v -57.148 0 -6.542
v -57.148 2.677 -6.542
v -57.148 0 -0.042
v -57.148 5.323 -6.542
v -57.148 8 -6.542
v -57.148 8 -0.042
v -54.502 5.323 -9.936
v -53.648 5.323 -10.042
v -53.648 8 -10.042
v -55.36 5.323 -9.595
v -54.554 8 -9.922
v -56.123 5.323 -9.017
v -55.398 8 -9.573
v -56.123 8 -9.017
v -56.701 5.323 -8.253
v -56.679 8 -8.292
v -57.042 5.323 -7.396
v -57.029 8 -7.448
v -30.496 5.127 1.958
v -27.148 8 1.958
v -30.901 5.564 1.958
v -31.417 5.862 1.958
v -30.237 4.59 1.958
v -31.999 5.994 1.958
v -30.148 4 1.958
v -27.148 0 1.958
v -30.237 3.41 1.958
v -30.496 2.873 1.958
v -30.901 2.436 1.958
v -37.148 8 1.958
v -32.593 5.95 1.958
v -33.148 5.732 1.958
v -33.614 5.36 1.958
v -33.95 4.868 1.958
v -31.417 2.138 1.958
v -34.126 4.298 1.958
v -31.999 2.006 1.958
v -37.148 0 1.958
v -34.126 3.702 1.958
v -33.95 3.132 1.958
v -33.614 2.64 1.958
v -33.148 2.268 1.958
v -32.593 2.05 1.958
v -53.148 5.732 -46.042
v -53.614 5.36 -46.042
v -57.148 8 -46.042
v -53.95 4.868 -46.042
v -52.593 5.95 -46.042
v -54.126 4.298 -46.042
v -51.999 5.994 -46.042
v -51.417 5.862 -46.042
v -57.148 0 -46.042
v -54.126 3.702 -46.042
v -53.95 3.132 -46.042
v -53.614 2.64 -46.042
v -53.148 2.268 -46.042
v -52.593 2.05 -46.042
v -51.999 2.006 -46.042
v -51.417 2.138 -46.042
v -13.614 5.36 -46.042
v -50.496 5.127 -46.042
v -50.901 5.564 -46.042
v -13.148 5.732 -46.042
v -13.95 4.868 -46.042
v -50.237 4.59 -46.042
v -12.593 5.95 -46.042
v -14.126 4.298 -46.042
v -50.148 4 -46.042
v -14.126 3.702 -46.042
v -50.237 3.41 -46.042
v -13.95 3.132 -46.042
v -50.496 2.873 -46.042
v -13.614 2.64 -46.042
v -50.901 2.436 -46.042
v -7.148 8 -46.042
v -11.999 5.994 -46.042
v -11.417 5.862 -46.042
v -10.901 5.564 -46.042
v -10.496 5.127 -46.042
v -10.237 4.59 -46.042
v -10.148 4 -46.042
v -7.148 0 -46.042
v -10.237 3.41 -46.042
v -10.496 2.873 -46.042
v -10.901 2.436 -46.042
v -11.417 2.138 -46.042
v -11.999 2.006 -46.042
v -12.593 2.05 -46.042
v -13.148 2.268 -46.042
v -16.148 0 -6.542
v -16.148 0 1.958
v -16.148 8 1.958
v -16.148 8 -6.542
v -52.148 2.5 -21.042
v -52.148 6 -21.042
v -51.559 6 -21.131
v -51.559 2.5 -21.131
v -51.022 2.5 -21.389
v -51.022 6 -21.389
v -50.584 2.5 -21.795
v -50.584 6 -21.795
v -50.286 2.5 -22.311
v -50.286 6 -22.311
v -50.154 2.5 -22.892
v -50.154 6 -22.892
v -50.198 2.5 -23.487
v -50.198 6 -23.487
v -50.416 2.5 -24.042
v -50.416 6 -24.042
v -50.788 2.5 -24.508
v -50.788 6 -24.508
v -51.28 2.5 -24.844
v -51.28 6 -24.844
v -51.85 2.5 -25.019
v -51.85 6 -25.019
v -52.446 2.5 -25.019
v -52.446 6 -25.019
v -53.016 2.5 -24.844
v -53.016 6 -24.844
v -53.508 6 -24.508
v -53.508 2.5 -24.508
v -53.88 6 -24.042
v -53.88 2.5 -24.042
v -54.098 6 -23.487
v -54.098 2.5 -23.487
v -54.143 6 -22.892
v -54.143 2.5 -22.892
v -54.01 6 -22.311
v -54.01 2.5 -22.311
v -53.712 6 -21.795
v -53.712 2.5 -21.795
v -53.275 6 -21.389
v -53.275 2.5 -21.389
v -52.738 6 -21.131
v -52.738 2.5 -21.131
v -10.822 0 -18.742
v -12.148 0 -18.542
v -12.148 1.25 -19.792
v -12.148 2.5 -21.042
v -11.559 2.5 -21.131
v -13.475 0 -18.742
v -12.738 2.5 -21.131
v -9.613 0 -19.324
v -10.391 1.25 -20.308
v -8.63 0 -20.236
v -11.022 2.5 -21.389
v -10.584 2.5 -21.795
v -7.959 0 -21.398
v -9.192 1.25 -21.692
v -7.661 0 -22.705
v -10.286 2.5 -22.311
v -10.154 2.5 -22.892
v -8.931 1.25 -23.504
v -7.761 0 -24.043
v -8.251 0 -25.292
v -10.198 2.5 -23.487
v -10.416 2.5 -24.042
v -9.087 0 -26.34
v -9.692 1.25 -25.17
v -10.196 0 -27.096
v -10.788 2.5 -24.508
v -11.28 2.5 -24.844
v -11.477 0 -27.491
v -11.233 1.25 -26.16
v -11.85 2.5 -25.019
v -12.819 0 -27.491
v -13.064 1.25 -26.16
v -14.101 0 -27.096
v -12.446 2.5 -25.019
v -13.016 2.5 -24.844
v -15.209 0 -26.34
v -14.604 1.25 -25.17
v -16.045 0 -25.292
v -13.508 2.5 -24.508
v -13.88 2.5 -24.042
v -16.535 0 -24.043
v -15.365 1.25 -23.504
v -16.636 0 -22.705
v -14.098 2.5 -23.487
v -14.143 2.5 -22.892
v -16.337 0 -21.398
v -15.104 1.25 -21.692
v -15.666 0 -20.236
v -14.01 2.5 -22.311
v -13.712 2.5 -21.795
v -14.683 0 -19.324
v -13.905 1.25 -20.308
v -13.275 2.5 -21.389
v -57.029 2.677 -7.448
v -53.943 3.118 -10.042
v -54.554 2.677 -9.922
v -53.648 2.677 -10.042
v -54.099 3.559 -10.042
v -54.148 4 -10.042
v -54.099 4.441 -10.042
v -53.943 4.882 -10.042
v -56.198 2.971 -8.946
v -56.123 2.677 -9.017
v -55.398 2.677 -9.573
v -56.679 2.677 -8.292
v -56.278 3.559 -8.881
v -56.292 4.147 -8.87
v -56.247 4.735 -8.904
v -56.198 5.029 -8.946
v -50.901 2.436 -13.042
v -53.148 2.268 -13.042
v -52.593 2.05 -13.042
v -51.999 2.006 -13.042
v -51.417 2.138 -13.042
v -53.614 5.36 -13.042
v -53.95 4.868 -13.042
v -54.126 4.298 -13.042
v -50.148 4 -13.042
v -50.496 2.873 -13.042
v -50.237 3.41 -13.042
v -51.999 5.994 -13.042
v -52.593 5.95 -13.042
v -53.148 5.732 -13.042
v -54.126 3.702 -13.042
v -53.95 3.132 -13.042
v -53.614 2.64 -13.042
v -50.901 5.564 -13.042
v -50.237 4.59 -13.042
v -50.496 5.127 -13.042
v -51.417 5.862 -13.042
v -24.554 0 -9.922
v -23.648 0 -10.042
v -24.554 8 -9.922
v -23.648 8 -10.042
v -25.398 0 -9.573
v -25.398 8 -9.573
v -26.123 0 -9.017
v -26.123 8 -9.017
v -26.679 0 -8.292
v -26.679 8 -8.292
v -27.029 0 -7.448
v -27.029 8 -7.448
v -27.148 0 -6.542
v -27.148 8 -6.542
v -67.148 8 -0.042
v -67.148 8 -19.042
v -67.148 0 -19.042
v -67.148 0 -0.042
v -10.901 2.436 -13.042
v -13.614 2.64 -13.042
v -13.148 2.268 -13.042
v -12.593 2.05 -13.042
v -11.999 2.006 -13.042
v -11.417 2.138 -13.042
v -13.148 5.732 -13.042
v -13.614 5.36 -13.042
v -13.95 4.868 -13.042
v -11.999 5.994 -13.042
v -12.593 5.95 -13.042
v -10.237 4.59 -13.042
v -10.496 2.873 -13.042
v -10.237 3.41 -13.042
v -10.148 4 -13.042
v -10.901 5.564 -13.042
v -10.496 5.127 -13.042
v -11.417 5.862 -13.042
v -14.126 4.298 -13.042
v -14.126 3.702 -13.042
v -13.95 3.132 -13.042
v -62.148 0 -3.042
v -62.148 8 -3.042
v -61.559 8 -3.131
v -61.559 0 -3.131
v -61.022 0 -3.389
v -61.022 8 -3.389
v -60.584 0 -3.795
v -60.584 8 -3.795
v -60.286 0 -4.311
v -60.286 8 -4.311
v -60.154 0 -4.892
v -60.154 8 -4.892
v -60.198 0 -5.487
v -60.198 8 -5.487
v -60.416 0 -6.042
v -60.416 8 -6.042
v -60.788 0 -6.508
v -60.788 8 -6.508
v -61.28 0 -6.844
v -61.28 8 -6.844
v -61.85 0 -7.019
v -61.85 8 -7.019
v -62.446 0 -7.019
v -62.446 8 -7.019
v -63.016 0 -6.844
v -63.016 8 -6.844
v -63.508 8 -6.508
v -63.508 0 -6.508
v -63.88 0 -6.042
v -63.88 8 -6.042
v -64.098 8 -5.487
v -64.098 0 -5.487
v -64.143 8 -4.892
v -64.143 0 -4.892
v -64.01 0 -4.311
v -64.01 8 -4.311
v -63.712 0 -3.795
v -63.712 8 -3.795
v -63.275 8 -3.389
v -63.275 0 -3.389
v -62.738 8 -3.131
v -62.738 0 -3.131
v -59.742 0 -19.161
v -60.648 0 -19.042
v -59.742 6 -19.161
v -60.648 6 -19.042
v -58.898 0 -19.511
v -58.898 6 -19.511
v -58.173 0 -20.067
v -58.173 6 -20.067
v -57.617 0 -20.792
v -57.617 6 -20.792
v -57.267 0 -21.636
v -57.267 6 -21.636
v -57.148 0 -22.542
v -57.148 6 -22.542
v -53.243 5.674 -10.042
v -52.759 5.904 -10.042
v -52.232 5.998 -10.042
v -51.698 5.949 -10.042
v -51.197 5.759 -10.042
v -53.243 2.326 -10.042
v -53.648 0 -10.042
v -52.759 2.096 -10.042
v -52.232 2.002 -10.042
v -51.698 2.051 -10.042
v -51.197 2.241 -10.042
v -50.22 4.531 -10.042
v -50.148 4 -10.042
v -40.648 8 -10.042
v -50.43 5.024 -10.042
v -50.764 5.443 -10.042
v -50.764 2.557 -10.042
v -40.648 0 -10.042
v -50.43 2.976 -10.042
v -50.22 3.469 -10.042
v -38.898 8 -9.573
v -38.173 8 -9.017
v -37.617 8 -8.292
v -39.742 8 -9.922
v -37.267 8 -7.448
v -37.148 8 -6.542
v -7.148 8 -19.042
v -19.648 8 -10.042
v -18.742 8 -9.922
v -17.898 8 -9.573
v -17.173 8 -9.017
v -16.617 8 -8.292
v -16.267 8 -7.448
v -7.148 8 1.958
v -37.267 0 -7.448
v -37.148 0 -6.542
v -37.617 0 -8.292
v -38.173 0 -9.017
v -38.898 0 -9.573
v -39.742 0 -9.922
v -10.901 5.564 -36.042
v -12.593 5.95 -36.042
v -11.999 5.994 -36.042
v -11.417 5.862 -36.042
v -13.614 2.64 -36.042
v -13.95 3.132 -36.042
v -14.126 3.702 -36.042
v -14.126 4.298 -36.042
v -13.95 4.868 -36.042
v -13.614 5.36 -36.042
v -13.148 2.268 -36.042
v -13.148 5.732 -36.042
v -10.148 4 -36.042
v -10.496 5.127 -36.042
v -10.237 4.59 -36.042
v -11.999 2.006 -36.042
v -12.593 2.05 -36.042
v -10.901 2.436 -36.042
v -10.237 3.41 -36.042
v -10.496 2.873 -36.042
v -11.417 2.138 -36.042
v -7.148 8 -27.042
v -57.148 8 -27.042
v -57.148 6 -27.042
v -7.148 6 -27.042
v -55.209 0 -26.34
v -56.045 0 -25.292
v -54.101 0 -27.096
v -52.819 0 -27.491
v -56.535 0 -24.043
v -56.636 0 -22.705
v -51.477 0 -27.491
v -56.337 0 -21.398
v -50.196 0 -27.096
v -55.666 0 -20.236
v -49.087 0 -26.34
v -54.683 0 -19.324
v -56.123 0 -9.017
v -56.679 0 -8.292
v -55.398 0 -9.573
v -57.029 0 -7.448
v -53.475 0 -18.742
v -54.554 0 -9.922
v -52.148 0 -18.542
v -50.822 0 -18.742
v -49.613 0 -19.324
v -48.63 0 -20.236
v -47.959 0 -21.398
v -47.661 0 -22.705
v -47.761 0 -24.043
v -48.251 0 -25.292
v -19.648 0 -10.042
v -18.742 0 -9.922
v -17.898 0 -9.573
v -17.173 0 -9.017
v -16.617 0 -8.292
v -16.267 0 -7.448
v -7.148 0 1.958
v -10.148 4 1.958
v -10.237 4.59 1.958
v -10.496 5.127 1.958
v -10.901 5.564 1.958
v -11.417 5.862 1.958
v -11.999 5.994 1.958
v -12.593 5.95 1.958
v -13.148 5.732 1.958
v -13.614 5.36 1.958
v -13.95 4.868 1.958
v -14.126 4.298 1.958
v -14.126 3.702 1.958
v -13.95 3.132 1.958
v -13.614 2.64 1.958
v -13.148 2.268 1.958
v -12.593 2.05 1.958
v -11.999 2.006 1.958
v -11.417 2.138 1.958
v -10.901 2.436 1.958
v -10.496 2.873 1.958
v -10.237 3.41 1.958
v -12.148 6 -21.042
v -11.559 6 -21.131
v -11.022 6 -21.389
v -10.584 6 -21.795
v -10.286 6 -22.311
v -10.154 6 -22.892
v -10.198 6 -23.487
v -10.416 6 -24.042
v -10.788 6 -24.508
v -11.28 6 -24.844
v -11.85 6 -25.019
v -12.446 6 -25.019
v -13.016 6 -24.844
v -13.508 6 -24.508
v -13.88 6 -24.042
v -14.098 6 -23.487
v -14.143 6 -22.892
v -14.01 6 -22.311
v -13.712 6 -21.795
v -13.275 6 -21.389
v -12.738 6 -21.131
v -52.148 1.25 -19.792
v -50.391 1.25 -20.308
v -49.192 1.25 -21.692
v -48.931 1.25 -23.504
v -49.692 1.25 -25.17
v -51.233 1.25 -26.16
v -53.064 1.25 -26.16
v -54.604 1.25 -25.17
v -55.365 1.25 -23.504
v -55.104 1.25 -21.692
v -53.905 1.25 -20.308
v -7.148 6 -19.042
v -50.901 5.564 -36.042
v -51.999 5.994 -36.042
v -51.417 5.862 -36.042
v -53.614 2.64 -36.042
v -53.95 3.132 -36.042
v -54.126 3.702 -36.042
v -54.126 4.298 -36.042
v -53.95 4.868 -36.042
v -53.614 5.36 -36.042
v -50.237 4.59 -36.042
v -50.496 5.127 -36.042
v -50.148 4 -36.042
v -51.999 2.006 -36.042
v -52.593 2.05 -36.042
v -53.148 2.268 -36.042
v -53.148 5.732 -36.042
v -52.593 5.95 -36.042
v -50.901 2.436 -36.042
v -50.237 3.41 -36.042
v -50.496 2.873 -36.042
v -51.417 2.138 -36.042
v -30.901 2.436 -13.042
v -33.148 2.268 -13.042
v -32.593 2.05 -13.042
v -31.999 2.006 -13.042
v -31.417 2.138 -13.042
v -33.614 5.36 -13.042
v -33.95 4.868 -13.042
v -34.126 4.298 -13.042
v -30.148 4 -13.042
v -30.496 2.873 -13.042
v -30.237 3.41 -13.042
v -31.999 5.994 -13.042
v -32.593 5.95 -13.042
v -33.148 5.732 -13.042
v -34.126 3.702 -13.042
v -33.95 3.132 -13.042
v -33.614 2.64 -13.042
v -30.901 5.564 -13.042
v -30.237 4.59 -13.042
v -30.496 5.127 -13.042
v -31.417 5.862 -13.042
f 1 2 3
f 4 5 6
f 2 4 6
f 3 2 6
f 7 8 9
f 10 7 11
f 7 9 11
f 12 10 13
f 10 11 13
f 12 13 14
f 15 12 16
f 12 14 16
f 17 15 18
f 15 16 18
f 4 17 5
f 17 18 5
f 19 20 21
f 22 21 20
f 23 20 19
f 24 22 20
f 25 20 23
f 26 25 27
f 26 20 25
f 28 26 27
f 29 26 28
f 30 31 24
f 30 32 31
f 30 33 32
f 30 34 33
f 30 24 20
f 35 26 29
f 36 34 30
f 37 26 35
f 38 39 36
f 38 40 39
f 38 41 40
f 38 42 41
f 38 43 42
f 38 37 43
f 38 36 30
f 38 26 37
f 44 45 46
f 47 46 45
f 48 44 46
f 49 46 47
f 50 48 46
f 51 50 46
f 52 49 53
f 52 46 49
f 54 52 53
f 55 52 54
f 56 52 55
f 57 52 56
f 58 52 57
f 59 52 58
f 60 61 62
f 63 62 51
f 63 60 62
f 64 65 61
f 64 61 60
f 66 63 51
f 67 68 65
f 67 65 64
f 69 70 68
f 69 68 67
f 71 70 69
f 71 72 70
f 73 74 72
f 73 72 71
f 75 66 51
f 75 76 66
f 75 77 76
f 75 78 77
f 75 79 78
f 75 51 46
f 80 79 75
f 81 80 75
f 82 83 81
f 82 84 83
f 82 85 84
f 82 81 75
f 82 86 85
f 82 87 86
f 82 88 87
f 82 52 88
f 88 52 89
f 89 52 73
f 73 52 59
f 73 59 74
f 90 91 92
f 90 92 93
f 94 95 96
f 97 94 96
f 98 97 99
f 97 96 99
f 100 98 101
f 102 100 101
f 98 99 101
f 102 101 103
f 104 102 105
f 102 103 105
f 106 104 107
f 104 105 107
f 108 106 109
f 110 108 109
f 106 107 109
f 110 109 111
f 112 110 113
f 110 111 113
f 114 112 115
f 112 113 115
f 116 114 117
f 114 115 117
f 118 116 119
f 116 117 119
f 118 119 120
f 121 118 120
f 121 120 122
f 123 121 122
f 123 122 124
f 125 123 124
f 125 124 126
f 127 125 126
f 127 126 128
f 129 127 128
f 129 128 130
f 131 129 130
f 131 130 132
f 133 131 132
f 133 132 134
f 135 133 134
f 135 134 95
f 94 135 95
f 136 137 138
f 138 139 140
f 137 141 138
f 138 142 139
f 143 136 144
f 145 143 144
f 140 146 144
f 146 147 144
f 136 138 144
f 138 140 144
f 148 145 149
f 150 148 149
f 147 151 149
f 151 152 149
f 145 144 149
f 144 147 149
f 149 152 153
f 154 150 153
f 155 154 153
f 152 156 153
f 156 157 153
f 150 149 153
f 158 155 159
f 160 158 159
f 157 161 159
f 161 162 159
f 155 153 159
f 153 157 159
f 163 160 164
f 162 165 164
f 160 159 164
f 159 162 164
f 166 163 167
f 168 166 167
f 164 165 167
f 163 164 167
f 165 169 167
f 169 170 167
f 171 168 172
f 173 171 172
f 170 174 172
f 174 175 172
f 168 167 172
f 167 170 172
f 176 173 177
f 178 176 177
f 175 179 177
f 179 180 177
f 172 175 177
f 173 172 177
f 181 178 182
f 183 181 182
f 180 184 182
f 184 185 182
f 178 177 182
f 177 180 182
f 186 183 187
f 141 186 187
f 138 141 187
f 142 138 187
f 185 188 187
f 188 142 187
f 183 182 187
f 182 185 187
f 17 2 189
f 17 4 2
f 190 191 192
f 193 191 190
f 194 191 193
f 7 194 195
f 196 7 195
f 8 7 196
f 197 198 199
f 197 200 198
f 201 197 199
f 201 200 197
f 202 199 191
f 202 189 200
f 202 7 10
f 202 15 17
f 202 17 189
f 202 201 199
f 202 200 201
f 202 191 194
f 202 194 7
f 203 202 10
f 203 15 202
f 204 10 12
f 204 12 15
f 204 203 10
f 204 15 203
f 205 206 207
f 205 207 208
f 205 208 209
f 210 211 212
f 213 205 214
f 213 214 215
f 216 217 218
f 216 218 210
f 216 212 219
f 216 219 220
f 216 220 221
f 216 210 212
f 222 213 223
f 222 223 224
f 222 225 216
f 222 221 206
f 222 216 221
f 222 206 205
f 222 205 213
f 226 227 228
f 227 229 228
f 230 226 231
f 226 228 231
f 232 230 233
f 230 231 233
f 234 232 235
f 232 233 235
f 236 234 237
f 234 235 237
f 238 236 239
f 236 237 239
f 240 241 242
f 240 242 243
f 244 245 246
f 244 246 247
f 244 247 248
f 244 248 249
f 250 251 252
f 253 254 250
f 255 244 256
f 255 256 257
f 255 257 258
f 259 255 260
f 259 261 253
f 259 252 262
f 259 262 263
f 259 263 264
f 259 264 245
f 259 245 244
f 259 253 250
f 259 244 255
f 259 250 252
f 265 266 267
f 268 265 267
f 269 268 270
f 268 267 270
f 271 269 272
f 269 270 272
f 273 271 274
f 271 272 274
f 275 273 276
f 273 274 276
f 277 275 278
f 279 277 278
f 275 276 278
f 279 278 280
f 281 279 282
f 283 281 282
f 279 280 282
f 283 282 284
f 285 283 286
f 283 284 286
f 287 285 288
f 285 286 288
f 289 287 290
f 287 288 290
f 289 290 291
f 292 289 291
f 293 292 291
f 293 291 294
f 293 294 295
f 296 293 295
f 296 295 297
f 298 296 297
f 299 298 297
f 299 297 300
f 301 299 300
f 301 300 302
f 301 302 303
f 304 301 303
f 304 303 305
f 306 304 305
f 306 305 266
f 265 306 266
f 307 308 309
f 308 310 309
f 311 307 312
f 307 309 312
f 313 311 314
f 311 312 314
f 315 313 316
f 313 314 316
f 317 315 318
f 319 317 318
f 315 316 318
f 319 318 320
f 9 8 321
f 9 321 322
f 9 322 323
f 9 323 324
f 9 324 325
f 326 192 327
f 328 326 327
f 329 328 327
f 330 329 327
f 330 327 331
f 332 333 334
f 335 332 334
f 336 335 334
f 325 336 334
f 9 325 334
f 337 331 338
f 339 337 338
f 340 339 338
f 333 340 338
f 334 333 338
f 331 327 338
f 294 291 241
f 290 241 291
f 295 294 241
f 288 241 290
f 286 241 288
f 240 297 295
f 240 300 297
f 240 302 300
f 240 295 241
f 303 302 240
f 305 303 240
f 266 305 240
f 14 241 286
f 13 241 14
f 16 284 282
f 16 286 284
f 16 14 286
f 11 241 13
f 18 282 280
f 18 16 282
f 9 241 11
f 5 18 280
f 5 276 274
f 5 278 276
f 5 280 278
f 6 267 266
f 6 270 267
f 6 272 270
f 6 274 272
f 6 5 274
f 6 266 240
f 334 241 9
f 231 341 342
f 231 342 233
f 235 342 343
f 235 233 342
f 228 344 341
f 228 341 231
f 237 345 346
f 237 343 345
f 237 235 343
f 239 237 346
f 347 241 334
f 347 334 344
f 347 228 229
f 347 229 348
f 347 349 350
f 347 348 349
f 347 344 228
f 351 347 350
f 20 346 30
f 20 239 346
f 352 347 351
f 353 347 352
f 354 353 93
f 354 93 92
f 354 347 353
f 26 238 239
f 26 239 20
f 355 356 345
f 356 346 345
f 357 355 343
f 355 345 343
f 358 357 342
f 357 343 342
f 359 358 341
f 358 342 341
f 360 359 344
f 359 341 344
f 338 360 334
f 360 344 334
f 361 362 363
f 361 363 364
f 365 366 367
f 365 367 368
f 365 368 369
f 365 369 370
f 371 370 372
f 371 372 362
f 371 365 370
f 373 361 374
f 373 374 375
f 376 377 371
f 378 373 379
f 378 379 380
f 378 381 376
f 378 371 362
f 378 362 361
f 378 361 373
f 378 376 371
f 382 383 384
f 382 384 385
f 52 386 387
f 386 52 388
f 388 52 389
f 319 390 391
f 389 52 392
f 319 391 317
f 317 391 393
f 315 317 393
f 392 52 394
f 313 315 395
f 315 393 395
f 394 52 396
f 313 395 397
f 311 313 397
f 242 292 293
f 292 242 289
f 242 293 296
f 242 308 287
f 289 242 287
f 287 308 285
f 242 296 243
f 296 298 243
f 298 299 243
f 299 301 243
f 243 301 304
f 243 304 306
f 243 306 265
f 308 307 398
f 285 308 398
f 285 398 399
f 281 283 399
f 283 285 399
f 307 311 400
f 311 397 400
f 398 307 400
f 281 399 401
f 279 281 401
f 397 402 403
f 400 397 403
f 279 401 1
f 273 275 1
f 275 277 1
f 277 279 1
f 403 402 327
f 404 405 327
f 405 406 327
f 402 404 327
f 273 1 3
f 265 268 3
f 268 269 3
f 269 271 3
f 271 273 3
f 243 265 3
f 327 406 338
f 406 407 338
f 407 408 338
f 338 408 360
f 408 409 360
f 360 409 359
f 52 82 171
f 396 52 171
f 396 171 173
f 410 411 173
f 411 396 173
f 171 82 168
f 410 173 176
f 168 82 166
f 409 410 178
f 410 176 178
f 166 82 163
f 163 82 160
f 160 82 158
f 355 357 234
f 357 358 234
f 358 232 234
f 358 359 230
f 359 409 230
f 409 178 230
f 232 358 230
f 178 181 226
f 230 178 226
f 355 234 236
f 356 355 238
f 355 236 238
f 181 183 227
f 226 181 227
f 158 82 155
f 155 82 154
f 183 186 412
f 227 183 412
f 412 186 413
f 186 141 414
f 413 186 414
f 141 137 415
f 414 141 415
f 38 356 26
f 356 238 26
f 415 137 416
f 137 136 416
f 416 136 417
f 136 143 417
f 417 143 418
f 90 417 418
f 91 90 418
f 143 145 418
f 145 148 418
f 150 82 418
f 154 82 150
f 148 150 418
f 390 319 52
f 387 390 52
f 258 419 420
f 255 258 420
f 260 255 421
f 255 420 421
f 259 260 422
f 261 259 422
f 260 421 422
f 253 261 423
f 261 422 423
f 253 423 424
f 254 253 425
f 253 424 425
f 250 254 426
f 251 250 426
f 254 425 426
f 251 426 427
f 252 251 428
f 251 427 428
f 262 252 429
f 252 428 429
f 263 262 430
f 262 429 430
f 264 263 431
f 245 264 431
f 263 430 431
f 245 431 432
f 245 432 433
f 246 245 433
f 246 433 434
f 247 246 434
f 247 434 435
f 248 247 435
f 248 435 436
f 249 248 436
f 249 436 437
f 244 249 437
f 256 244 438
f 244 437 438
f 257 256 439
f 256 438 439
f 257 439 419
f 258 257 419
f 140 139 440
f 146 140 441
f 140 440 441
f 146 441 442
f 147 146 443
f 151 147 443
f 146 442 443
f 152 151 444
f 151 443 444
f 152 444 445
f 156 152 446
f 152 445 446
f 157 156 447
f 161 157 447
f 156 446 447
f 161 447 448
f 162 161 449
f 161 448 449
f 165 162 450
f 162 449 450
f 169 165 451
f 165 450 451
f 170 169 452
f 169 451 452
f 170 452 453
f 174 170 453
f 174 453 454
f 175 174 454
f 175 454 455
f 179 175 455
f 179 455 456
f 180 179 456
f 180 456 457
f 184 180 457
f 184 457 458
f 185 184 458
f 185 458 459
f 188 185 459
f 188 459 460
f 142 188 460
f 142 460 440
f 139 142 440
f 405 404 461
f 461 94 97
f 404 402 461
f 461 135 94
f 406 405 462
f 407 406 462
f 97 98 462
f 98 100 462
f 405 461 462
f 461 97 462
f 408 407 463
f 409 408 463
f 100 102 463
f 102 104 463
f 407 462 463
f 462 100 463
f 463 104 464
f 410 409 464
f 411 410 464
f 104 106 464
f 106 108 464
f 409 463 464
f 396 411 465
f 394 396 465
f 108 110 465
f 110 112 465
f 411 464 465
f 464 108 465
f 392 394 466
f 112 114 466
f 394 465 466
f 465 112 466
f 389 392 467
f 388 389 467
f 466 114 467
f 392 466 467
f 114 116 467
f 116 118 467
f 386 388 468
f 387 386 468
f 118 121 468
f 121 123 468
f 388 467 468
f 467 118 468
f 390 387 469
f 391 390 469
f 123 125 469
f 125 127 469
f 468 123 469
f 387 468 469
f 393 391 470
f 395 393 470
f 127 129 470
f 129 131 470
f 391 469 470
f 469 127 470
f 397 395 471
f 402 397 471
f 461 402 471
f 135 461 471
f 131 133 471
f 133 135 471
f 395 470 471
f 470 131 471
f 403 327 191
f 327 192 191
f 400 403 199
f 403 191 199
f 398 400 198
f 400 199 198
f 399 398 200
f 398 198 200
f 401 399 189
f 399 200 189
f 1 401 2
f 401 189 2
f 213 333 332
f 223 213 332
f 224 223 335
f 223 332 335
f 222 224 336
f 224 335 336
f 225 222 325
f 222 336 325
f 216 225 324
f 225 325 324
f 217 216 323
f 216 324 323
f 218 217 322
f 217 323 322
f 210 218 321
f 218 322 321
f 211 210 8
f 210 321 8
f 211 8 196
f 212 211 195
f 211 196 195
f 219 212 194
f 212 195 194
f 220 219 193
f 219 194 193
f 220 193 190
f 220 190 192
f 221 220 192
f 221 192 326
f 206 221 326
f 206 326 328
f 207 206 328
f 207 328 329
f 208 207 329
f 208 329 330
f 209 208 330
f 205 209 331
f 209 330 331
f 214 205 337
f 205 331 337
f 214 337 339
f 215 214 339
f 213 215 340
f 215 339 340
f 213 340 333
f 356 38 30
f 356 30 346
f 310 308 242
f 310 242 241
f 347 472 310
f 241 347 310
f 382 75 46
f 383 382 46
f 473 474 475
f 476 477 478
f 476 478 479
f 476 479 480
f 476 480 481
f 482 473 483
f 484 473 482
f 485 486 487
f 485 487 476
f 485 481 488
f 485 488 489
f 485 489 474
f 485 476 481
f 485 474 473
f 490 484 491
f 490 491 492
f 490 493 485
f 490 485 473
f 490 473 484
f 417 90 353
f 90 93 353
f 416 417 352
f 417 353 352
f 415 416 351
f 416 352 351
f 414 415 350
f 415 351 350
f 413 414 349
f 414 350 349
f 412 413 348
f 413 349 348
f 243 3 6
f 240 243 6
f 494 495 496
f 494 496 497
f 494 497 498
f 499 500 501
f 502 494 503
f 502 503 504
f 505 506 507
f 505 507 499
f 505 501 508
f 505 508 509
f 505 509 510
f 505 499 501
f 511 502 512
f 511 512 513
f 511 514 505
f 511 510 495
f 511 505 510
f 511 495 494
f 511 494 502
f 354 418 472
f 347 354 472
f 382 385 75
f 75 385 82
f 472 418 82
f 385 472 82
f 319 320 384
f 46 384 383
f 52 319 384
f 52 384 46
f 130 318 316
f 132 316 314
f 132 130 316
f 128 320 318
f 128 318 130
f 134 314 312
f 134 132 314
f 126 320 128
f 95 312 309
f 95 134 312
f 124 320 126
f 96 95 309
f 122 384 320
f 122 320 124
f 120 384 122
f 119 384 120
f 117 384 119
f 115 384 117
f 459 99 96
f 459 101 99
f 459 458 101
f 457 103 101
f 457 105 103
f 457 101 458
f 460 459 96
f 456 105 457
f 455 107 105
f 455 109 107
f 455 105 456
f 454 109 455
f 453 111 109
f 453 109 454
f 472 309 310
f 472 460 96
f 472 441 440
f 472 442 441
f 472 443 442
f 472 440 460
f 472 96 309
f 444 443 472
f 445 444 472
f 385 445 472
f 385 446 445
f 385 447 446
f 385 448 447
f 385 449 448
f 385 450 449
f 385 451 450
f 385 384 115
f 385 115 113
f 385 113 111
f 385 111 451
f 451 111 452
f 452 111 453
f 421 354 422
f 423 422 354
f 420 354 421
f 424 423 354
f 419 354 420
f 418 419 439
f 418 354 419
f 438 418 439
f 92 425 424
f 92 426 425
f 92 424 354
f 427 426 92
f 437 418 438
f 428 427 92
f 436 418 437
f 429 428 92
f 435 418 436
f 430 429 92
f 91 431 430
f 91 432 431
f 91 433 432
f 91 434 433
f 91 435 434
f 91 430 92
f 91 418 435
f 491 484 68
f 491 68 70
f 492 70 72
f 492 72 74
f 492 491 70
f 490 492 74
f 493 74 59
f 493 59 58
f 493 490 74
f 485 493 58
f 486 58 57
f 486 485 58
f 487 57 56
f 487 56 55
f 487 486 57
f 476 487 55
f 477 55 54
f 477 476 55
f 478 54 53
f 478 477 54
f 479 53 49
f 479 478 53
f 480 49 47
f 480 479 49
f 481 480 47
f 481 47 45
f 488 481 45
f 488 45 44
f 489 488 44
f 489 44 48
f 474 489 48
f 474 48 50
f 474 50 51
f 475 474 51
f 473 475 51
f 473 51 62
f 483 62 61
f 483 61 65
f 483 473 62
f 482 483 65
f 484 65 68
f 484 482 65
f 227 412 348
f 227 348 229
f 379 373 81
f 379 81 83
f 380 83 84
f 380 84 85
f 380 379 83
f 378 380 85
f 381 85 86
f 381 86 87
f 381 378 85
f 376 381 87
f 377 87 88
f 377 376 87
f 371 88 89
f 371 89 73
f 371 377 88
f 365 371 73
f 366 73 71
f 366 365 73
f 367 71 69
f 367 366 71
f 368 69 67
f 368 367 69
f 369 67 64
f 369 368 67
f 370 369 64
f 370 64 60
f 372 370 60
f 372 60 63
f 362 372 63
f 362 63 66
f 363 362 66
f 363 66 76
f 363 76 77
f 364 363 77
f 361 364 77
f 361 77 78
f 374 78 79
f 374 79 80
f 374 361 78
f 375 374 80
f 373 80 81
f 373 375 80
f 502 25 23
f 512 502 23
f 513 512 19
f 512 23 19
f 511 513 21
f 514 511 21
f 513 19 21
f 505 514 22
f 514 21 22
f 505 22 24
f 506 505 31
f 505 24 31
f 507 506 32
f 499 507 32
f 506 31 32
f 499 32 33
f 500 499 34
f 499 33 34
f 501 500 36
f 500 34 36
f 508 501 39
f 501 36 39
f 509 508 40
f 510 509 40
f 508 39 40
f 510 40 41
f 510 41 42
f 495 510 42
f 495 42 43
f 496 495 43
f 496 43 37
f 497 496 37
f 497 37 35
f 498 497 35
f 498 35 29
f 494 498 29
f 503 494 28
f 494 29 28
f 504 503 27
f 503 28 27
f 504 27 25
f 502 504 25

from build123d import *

# Parameters (mm, degrees)
BOSS_EXTRU_1_DEPTH      = 8
ESQUISSE2_R             = 2
ENL_V_MAT_EXTRU_1_DEPTH = 15
ENL_V_START             = -10
ESQUISSE3_R             = 2
ENL_V_MAT_EXTRU_2_DEPTH = 10
ESQUISSE4_R             = 2
ENL_V_MAT_EXTRU_3_DEPTH = 10
CHANFREIN1_SIZE         = 2.5
ESQUISSE5_W             = 50
ESQUISSE5_H             = 8
ENL_V_MAT_EXTRU_4_DEPTH = 2
ESQUISSE6_W             = 19
ESQUISSE6_H             = 8
BOSS_EXTRU_2_DEPTH      = 10
CONG_1_R                = 3.5
ESQUISSE7_R             = 2
ENL_V_MAT_EXTRU_5_DEPTH = 82.808975418


with BuildPart() as part:
    # Esquisse1 → Boss.-Extru.1 (new body)
    with BuildSketch(Plane(origin=(0, 0, 0), x_dir=(1, 0, 0), z_dir=(0, 1, 0))):
        Polygon((-57.148145082, 46.041666667), (-7.148145082, 46.041666667), (-7.148145082, 16.041666667), (-7.148145082, -1.958333333), (-16.148145082, -1.958333333), (-16.148145082, 10.041666667), (-27.148145082, 10.041666667), (-27.148145082, -1.958333333), (-37.148145082, -1.958333333), (-37.148145082, 10.041666667), (-48.148145082, 10.041666667), (-57.148145082, 10.041666667), align=None)
    extrude(amount=BOSS_EXTRU_1_DEPTH)

    # Esquisse2 → Enlèv. mat.-Extru.1 (cut)
    with BuildSketch(Plane.XY.offset(1.958333333)):
        with Locations((-52.148145082, 4)):
            Circle(ESQUISSE2_R)
        with Locations((-12.148145082, 4)):
            Circle(ESQUISSE2_R)
        with Locations((-32.148145082, 4)):
            Circle(ESQUISSE2_R)
    extrude(amount=-ENL_V_MAT_EXTRU_1_DEPTH, mode=Mode.SUBTRACT)

    # Esquisse3 → Enlèv. mat.-Extru.2 (cut)
    with BuildSketch(Plane(origin=(0, 0, -46.041666667), x_dir=(-1, 0, 0), z_dir=(0, 0, -1)).offset(ENL_V_START)):
        with Locations(Location((12.148145082, 4, 0), (0, 0, 180))):
            Circle(ESQUISSE3_R)
        with Locations(Location((52.148145082, 4, 0), (0, 0, 180))):
            Circle(ESQUISSE3_R)
    extrude(amount=ENL_V_MAT_EXTRU_2_DEPTH, mode=Mode.SUBTRACT)

    # Esquisse4 → Enlèv. mat.-Extru.3 (cut)
    with BuildSketch(Plane(origin=(0, 8, 0), x_dir=(1, 0, 0), z_dir=(0, 1, 0))):
        with Locations(Location((-52.148145082, 23.041666667, 0), (0, 0, 270))):
            Circle(ESQUISSE4_R)
        with Locations(Location((-12.148145082, 23.041666667, 0), (0, 0, 270))):
            Circle(ESQUISSE4_R)
    extrude(amount=-ENL_V_MAT_EXTRU_3_DEPTH, mode=Mode.SUBTRACT)

    # Chanfrein1
    chanfrein1_edges = [part.edges().sort_by_distance(p)[0] for p in [
        (-52.148145082, 0, -25.041666667),
        (-12.148145082, 0, -25.041666667),
    ]]
    chamfer(chanfrein1_edges, length=CHANFREIN1_SIZE)

    # Esquisse5 → Enlèv. mat.-Extru.4 (cut)
    with BuildSketch(Plane(origin=(0, 8, 0), x_dir=(1, 0, 0), z_dir=(0, 1, 0))):
        with Locations((-32.148145082, 23.041666667)):
            Rectangle(ESQUISSE5_W, ESQUISSE5_H)
    extrude(amount=-ENL_V_MAT_EXTRU_4_DEPTH, mode=Mode.SUBTRACT)

    # Esquisse6 → Boss.-Extru.2 (add)
    with BuildSketch(Plane.ZY.offset(57.148145082)):
        with Locations((-9.541666667, 4)):
            Rectangle(ESQUISSE6_W, ESQUISSE6_H)
    extrude(amount=BOSS_EXTRU_2_DEPTH)

    # Congé1
    cong_1_edges = [part.edges().sort_by_distance(p)[0] for p in [
        (-16.148145082, 4, -10.041666667),
        (-27.148145082, 4, -10.041666667),
        (-37.148145082, 4, -10.041666667),
        (-57.148145082, 4, -10.041666667),
        (-57.148145082, 3, -19.041666667),
    ]]
    fillet(cong_1_edges, radius=CONG_1_R)

    # Esquisse7 → Enlèv. mat.-Extru.5 (cut, through all)
    with BuildSketch(Plane(origin=(0, 8, 0), x_dir=(1, 0, 0), z_dir=(0, 1, 0))):
        with Locations(Location((-62.148145082, 5.041666667, 0), (0, 0, 270))):
            Circle(ESQUISSE7_R)
    extrude(amount=-ENL_V_MAT_EXTRU_5_DEPTH, mode=Mode.SUBTRACT)


solid = part.part
